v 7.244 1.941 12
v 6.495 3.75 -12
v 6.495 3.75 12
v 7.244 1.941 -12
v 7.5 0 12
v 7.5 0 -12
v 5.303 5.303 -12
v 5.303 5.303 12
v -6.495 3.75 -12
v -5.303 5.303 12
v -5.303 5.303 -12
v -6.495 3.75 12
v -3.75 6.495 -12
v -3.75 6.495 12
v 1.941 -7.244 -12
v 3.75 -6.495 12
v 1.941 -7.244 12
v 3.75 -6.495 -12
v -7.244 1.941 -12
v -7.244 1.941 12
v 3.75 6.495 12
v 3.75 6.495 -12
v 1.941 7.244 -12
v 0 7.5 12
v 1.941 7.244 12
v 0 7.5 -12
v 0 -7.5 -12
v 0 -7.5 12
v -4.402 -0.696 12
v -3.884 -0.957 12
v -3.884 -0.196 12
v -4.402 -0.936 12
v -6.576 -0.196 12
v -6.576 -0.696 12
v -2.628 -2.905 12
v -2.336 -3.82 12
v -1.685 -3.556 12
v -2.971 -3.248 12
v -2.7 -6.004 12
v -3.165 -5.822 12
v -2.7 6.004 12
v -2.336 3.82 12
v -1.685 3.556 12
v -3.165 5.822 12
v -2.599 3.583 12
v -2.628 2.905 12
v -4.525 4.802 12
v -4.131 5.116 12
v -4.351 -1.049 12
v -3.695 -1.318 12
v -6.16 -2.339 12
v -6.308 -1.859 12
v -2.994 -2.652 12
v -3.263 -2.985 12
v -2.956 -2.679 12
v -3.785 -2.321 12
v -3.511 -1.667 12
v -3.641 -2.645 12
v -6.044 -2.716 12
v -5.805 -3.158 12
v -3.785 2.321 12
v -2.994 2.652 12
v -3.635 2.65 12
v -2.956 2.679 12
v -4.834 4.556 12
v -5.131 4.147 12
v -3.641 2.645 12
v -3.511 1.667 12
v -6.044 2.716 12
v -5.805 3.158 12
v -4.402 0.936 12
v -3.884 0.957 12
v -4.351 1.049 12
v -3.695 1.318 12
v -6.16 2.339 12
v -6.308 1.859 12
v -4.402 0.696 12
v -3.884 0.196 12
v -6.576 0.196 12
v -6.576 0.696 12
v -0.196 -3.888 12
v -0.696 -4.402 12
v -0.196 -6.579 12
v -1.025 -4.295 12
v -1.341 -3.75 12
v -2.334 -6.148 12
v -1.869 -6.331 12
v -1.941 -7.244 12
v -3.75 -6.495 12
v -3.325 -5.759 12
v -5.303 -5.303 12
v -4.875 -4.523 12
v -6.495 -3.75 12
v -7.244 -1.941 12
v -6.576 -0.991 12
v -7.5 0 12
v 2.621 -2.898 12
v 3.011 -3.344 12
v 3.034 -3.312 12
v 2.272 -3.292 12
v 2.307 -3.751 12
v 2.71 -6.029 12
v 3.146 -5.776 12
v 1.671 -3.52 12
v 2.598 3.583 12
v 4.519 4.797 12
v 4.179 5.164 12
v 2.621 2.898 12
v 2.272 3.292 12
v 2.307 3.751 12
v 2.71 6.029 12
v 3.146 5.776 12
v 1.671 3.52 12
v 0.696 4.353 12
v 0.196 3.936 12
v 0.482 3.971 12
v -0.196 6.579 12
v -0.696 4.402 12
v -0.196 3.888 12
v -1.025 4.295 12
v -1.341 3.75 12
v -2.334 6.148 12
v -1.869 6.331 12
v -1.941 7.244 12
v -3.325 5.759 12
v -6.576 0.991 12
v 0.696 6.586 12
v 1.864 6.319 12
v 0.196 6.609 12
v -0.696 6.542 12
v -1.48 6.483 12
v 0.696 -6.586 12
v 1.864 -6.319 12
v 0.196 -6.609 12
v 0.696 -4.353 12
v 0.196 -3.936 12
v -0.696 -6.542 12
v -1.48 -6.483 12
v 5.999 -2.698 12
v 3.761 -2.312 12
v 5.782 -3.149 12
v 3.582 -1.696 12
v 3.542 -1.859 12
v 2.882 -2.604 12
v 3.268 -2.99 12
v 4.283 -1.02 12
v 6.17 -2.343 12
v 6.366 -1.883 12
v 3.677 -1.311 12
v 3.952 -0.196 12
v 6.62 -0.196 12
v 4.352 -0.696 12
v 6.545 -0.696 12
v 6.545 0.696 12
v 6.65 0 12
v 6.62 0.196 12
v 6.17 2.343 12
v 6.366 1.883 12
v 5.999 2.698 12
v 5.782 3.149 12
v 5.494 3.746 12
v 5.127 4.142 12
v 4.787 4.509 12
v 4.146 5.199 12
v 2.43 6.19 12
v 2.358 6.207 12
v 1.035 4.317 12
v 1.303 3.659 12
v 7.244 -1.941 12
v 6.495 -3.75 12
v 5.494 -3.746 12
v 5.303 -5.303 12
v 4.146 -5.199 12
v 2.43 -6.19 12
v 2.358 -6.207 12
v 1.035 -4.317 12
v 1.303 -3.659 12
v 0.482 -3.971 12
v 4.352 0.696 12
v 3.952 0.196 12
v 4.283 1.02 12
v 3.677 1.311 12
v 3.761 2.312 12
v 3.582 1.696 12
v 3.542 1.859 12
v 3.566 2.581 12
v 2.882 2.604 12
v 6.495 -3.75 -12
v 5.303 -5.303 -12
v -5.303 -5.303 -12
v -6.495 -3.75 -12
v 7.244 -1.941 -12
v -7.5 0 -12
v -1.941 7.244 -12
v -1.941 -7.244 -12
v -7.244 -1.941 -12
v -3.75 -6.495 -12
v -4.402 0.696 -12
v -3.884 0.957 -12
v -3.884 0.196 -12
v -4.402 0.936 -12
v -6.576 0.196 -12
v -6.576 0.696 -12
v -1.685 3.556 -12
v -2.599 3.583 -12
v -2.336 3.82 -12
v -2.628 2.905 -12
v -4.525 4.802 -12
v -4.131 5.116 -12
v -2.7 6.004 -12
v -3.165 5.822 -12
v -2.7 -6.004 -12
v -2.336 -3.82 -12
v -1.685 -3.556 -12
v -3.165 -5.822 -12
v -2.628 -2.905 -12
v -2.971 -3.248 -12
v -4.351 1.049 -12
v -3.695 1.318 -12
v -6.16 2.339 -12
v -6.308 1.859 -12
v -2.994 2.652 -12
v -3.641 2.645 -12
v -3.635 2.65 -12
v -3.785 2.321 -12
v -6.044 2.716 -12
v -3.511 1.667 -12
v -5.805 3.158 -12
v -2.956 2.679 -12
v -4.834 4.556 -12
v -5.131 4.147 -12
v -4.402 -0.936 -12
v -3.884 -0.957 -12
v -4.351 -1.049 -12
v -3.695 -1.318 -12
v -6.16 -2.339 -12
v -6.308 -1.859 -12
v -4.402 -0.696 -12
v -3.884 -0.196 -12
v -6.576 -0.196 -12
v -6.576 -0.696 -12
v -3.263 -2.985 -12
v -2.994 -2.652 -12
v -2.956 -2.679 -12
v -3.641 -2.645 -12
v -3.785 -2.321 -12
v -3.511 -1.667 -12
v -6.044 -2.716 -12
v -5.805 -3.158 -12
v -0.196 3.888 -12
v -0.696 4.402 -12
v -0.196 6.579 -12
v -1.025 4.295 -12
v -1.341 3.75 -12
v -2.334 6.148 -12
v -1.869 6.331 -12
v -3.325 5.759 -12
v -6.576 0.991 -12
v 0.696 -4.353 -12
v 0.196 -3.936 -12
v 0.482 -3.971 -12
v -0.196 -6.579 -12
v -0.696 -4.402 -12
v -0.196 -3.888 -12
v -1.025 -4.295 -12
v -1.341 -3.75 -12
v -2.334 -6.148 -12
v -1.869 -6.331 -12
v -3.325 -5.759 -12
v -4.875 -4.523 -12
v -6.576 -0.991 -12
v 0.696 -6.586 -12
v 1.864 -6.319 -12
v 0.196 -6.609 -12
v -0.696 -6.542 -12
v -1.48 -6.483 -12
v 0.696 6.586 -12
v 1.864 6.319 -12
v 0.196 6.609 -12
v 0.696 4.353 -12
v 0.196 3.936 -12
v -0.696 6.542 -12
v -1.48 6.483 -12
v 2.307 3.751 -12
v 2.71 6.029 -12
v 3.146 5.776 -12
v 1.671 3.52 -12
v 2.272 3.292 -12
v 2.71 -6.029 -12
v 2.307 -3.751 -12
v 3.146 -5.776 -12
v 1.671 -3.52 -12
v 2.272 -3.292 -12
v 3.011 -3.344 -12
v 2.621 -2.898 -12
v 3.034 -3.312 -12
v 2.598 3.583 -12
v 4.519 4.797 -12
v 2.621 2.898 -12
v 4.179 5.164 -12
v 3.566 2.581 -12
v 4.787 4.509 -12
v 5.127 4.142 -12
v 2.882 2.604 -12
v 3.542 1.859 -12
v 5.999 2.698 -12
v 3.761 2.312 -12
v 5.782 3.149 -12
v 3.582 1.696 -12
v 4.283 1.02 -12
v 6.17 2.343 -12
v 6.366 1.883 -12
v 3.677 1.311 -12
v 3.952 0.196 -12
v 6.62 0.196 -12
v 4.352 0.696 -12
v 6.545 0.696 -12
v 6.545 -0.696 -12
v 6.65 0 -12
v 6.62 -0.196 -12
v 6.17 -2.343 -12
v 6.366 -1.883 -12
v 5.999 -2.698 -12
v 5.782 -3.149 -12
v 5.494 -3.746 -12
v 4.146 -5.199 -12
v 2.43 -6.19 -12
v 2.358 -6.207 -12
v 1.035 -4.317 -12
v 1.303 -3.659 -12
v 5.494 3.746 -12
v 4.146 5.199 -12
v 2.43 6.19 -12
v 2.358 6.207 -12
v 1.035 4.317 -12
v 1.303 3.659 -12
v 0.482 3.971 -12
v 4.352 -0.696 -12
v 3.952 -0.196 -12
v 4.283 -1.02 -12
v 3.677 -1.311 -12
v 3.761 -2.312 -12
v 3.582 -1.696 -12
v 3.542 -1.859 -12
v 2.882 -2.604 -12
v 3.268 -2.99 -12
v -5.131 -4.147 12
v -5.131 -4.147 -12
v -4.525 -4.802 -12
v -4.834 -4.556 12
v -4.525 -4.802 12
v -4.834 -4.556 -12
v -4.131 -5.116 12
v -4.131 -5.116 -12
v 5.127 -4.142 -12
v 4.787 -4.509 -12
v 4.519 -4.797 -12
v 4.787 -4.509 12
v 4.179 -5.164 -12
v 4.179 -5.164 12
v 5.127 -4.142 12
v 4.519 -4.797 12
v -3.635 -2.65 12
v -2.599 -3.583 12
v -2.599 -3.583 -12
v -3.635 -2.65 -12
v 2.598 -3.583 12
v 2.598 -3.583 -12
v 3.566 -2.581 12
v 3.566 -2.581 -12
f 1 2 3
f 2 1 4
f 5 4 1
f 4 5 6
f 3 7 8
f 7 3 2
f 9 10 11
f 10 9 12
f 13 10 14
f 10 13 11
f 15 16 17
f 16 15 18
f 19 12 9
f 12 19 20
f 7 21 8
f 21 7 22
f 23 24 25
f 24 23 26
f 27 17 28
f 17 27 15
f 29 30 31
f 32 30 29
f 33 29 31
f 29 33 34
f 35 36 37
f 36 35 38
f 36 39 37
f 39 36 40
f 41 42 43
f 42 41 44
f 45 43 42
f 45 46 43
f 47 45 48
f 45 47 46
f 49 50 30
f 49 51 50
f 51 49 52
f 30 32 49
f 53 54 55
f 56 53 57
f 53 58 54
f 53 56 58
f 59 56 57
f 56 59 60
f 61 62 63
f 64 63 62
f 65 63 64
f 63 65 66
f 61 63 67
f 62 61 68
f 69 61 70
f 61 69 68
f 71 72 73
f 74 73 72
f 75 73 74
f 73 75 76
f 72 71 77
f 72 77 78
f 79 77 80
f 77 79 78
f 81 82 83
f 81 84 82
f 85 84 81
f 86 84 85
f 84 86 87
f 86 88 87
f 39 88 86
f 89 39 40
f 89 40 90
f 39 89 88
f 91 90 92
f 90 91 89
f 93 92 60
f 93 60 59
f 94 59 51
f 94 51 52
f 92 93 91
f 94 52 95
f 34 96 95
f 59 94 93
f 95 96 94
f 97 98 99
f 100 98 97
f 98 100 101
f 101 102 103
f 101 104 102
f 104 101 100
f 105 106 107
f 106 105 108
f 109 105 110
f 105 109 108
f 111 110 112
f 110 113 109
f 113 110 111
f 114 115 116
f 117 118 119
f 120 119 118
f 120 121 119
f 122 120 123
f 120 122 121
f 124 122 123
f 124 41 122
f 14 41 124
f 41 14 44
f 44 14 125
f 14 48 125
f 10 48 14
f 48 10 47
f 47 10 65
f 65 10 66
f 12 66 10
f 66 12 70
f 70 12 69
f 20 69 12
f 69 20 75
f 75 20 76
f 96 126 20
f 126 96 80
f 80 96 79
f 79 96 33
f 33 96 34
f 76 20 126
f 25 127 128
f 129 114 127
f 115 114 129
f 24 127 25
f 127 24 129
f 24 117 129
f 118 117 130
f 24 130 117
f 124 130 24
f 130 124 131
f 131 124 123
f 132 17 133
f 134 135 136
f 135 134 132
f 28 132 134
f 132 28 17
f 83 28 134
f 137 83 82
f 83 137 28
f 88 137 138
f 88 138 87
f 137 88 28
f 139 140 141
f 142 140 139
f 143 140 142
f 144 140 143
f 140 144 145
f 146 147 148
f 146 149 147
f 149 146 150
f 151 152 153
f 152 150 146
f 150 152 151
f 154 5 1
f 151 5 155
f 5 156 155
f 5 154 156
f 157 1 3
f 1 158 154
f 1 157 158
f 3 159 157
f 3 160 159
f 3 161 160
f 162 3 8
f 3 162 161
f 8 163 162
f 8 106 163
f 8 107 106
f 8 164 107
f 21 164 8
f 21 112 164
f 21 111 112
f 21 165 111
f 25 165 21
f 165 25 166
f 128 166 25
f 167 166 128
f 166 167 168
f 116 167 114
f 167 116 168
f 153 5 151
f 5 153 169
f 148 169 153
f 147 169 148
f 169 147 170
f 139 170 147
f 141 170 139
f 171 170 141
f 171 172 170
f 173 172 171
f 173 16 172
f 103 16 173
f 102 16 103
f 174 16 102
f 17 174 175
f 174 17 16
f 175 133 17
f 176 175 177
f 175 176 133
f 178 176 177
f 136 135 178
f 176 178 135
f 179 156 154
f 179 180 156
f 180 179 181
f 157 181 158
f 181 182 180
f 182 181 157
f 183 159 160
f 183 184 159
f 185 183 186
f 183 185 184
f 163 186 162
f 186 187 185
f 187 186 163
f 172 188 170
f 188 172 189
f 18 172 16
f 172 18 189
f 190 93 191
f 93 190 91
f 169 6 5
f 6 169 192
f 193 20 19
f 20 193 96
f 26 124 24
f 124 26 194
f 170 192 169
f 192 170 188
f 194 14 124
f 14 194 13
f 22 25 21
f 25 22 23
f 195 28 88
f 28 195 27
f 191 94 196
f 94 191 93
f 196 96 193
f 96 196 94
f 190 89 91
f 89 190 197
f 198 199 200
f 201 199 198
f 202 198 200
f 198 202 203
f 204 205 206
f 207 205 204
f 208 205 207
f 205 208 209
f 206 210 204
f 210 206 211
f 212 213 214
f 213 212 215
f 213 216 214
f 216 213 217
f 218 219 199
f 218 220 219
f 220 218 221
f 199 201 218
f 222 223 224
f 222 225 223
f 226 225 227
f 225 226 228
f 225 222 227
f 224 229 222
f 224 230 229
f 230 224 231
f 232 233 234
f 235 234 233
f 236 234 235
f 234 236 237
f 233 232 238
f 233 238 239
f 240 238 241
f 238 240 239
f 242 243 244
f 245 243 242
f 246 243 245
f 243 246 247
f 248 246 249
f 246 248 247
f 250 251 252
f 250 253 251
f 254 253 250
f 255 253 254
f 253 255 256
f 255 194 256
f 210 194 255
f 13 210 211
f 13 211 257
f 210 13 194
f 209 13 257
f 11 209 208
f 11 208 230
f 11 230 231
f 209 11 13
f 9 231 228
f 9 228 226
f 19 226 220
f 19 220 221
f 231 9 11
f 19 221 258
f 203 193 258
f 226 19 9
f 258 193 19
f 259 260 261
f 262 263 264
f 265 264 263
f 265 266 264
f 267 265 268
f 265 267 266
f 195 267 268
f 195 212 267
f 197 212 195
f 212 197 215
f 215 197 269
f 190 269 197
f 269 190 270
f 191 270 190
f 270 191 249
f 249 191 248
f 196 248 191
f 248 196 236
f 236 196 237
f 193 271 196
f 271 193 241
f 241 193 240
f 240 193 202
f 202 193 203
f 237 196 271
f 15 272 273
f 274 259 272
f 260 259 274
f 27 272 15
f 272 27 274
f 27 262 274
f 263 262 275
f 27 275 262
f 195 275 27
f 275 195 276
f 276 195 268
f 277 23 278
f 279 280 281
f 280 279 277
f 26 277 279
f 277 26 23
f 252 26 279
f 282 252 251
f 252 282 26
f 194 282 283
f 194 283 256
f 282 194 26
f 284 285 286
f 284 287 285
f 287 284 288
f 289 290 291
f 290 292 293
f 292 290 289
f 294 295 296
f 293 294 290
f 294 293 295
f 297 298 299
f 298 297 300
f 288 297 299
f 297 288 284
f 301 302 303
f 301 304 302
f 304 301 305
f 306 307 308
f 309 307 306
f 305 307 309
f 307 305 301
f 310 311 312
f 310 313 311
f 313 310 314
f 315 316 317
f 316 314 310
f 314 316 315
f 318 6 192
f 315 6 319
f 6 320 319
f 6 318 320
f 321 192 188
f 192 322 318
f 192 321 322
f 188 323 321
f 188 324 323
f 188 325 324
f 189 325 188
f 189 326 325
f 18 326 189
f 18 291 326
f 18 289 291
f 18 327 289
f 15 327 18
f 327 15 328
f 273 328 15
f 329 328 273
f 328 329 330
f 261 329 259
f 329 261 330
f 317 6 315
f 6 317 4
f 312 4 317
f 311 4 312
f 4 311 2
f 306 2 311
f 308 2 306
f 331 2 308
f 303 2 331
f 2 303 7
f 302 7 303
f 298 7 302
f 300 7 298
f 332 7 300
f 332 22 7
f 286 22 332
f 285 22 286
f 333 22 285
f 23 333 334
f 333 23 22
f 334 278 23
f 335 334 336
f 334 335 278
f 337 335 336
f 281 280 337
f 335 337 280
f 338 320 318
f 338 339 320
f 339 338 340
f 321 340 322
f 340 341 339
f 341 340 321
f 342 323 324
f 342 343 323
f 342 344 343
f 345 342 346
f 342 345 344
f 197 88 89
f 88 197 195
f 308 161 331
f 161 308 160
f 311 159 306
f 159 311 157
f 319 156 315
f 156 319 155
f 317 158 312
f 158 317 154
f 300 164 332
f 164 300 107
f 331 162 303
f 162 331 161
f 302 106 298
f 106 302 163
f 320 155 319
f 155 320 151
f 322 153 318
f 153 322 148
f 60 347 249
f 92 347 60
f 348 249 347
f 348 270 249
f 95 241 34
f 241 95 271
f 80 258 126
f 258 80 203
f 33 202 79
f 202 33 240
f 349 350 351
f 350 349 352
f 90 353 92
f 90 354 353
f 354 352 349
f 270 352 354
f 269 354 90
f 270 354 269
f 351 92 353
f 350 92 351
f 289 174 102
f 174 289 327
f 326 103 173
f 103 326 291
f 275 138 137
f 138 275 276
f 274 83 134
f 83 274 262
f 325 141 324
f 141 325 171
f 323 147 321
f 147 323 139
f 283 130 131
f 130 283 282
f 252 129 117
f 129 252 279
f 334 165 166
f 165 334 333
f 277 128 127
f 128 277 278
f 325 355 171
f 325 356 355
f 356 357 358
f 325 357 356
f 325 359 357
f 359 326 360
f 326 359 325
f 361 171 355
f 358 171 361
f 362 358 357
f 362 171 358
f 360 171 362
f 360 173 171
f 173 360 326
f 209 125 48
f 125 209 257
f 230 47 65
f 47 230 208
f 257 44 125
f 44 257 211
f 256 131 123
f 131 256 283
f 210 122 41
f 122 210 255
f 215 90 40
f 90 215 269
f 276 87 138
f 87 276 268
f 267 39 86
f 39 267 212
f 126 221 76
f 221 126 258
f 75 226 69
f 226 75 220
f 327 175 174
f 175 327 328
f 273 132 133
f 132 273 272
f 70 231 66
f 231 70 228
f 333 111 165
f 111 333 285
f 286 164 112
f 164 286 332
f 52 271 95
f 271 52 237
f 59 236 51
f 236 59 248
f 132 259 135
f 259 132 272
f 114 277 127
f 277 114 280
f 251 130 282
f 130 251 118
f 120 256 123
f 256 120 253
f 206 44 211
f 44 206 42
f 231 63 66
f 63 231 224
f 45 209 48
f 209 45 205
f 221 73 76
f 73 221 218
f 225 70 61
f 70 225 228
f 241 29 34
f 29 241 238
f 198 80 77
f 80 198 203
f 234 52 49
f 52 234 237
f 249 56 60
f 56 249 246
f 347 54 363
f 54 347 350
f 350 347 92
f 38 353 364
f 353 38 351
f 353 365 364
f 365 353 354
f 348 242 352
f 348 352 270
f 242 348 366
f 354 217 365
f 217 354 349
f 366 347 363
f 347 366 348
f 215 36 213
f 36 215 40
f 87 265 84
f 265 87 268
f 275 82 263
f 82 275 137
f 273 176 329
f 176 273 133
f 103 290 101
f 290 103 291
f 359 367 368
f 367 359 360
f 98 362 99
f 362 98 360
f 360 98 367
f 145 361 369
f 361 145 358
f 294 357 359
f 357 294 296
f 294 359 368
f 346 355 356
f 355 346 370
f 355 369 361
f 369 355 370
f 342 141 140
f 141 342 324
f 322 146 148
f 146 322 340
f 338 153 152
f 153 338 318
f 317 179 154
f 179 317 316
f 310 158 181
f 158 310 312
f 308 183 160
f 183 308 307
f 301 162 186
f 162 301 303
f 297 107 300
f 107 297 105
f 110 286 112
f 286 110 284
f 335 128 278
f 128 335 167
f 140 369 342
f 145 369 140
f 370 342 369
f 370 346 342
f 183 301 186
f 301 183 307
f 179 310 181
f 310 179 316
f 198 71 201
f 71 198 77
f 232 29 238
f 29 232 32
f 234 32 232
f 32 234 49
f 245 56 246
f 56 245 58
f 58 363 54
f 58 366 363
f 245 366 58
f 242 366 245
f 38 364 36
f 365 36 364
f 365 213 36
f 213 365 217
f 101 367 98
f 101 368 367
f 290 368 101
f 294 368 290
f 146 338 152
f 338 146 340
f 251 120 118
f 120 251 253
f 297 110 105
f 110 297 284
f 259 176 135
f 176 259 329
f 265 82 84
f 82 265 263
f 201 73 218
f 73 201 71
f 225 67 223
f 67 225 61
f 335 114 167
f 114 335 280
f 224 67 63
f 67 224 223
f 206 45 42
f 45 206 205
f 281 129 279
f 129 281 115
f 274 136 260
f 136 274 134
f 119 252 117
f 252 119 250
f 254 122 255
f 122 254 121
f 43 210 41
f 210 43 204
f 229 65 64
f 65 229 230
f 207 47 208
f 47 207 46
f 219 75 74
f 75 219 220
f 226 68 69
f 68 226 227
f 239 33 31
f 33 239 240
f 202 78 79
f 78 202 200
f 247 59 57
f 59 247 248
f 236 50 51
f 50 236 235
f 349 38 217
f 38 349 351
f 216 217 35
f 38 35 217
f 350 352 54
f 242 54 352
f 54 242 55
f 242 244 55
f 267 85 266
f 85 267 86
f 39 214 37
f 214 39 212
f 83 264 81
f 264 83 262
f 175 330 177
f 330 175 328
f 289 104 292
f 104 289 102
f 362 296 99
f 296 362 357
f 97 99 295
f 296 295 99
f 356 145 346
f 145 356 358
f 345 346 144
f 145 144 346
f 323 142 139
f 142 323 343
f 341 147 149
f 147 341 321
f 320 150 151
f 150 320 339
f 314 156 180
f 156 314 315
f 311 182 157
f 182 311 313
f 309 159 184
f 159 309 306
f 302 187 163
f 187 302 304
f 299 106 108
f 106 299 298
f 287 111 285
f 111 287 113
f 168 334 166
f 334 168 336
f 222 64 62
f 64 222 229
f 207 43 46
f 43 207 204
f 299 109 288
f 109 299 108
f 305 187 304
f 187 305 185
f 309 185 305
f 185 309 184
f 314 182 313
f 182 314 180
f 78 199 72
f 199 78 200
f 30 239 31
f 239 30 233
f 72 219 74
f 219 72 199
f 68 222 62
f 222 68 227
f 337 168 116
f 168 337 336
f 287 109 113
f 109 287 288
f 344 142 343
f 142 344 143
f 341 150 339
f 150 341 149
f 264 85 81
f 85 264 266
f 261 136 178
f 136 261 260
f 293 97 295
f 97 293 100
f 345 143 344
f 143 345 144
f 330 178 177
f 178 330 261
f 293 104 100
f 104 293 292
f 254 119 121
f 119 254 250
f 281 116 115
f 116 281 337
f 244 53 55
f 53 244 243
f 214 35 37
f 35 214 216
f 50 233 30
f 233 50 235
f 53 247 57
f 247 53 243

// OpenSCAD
/* toothedLinearBearing
 * Copyright (c) 2012 by Krallinger Sebastian [s.krallinger+cc@gmail.com]
 * Dual-licensed under 
 * Creative Commons Attribution-ShareAlike 3.0 (CC BY-SA) [http://creativecommons.org/licenses/by-sa/3.0/]
 * and
 * GPL v2 or later [http://www.gnu.org/licenses/].
 */

/* necessary libs:
 * https://github.com/kr2/MCAD
 */

 
// ************* units.scad ************* //




mm = 1;
cm = 10 * mm;
dm = 100 * mm;
m = 1000 * mm;

inch = 25.4 * mm;

X = [1, 0, 0];
Y = [0, 1, 0];
Z = [0, 0, 1];

M3 = 3*mm;
M4 = 4*mm;
M5 = 5*mm;
M6 = 6*mm;
M8 = 8*mm;



epsilon = 0.01*mm;
OS = epsilon;

// ************* toothedLinearBearing.scad ************* //



/**
* @brief   Toothed Linear Bearing (TLB).
* 
* Linear Bearing with parallel triagnles towards the center.
* @param  inner_d   	Inner diameter (Axis Diameter)
* @param  outer_d   	outer diameter (holder Diameter)
* @param  h   			height
* @param  stringWidth   width of an single string of your printer (this defines the width of the tooth walls)
* @param  minWallThickness   minimum thickness of the outer wall. 
* @param  tooths   		number of toohts on the innside
* @param  toothRatio   	coverd length of the inner ring
**/ 
module TLB_linearBearing(
							inner_d          = 8, 
							outer_d          = 15,
							h                = 24,
							stringWidth      = 0.5,
							minWallThickness = 0.85, 
							tooths           = 16, 
							toothRatio       = 0.25
						) {
	
	stringWidth          = stringWidth; //!< the layer width of one string
	
	TLB_innerD           = inner_d;
	TLB_outerD           = outer_d;
	TLB_minWallThickness = minWallThickness;
	TLB_h                = h;
	TLB_tooths           = tooths;
	
	TLB_toothRate        = toothRatio;
	
	
	gapWidth             = (TLB_innerD*PI)/TLB_tooths *TLB_toothRate;
	//echo(str("gap Width: ", gapWidth));
	middR                = TLB_outerD/2- TLB_minWallThickness;
	
	//outer ring
	difference() {
		cylinder(r=TLB_outerD/2, h=TLB_h, center=true);
		cylinder(r=middR, h=TLB_h+2*OS, center=true);
	}
	

	difference() {
		union(){
			cylinder(r=TLB_innerD/2 + stringWidth, h=TLB_h, center=true);

			for (i=[0:360 / TLB_tooths : 360]) {
				rotate(a=i,v=Z) translate([-(gapWidth+2*stringWidth)/2, 0, -TLB_h/2])
					cube(size=[gapWidth+2*stringWidth, middR+OS, TLB_h], center=false);
			}
		}
		union(){
			cylinder(r=TLB_innerD/2, h=TLB_h+2*OS, center=true);
			
			for (i=[0:360 / TLB_tooths : 360]) {
				rotate(a=i,v=Z) translate([-gapWidth/2, 0, -TLB_h/2-OS]) 
					cube(size=[gapWidth, middR, TLB_h+2*OS], center=false);
			}
		}
	}

}

module TLB_test() {
	TLB_linearBearing(
							inner_d          = 8, 
							outer_d          = 15,
							h                = 24,
							stringWidth      = 0.5,
							minWallThickness = 0.85, 
							tooths           = 16, 
							toothRatio       = 0.25
						);
	translate([30, 0, 0]) 
	TLB_linearBearing(
							inner_d          = 8, 
							outer_d          = 20,
							h                = 12,
							stringWidth      = 0.5,
							minWallThickness = 3, 
							tooths           = 4, 
							toothRatio       = 0.25
						);

	translate([60, 0, 0]) 
	TLB_linearBearing(
							inner_d          = 12, 
							outer_d          = 26,
							h                = 6,
							stringWidth      = 1.5,
							minWallThickness = 3, 
							tooths           = 7, 
							toothRatio       = 0.6
						);
}
//TLB_test();


module TLB_print(s = 4) {
	$fn =100;
	dist = 2;
	translate([-s*(15+dist)/2-15/2, -s*(15+dist)/2, 0]) 
	for (x=[1:s]) {
		for (y=[1:s]) {
			if (y%2) {
				translate([x*(15+ dist)+15/2, y*(15*4/5 +dist), 0]) 
					TLB_linearBearing(
							inner_d          = 8, 
							outer_d          = 15,
							h                = 24,
							stringWidth      = 0.5,
							minWallThickness = 0.85, 
							tooths           = 16, 
							toothRatio       = 0.25);
			}else{
				translate([x*(15 +dist) -dist/2, y*(15*4/5 +dist), 0]) 
					TLB_linearBearing(
							inner_d          = 8, 
							outer_d          = 15,
							h                = 24,
							stringWidth      = 0.5,
							minWallThickness = 0.85, 
							tooths           = 16, 
							toothRatio       = 0.25);
			}
		}
	}
}
//TLB_print(s = 4);


					TLB_linearBearing(
							inner_d          = 8, 
							outer_d          = 15,
							h                = 24,
							stringWidth      = 0.5,
							minWallThickness = 0.85, 
							tooths           = 16, 
							toothRatio       = 0.25);
